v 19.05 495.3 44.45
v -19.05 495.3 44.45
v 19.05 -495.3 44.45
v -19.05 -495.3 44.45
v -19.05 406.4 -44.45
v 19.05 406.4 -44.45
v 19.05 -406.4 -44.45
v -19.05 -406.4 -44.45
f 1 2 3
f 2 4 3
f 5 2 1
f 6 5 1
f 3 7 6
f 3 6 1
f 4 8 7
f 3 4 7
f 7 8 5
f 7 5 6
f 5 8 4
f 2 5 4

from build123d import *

# Parameters (mm, degrees)
F0_W     = 38.1
F0_H     = 88.9
F1_DEPTH = 495.3
F2_SIZE2 = 88.89999
F2_SIZE  = 88.89999
F3_SIZE2 = 88.89999
F3_SIZE  = 88.89999


# Not quite as in the source:
# - a fillet or chamfer is up to 0.001 mm smaller than in the source, because OpenCascade refuses the exact size


with BuildPart() as f1:
    # F0 (on Front) → F1 (new body, symmetric)
    with BuildSketch(Plane.XZ):
        Rectangle(F0_W, F0_H)
    extrude(amount=F1_DEPTH, both=True)

    # F2 (size 88.9 and 88.9 in the source; OpenCascade refuses exactly that, so slightly less here)
    f2_edges = [f1.edges().sort_by_distance(p)[0] for p in [
        (0, -495.3, -44.45),
    ]]
    chamfer(f2_edges, length=F2_SIZE, length2=F2_SIZE2)

    # F3 (size 88.9 and 88.9 in the source; OpenCascade refuses exactly that, so slightly less here)
    f3_edges = [f1.edges().sort_by_distance(p)[0] for p in [
        (0, 495.3, -44.45),
    ]]
    chamfer(f3_edges, length=F3_SIZE, length2=F3_SIZE2)


solid = f1.part
